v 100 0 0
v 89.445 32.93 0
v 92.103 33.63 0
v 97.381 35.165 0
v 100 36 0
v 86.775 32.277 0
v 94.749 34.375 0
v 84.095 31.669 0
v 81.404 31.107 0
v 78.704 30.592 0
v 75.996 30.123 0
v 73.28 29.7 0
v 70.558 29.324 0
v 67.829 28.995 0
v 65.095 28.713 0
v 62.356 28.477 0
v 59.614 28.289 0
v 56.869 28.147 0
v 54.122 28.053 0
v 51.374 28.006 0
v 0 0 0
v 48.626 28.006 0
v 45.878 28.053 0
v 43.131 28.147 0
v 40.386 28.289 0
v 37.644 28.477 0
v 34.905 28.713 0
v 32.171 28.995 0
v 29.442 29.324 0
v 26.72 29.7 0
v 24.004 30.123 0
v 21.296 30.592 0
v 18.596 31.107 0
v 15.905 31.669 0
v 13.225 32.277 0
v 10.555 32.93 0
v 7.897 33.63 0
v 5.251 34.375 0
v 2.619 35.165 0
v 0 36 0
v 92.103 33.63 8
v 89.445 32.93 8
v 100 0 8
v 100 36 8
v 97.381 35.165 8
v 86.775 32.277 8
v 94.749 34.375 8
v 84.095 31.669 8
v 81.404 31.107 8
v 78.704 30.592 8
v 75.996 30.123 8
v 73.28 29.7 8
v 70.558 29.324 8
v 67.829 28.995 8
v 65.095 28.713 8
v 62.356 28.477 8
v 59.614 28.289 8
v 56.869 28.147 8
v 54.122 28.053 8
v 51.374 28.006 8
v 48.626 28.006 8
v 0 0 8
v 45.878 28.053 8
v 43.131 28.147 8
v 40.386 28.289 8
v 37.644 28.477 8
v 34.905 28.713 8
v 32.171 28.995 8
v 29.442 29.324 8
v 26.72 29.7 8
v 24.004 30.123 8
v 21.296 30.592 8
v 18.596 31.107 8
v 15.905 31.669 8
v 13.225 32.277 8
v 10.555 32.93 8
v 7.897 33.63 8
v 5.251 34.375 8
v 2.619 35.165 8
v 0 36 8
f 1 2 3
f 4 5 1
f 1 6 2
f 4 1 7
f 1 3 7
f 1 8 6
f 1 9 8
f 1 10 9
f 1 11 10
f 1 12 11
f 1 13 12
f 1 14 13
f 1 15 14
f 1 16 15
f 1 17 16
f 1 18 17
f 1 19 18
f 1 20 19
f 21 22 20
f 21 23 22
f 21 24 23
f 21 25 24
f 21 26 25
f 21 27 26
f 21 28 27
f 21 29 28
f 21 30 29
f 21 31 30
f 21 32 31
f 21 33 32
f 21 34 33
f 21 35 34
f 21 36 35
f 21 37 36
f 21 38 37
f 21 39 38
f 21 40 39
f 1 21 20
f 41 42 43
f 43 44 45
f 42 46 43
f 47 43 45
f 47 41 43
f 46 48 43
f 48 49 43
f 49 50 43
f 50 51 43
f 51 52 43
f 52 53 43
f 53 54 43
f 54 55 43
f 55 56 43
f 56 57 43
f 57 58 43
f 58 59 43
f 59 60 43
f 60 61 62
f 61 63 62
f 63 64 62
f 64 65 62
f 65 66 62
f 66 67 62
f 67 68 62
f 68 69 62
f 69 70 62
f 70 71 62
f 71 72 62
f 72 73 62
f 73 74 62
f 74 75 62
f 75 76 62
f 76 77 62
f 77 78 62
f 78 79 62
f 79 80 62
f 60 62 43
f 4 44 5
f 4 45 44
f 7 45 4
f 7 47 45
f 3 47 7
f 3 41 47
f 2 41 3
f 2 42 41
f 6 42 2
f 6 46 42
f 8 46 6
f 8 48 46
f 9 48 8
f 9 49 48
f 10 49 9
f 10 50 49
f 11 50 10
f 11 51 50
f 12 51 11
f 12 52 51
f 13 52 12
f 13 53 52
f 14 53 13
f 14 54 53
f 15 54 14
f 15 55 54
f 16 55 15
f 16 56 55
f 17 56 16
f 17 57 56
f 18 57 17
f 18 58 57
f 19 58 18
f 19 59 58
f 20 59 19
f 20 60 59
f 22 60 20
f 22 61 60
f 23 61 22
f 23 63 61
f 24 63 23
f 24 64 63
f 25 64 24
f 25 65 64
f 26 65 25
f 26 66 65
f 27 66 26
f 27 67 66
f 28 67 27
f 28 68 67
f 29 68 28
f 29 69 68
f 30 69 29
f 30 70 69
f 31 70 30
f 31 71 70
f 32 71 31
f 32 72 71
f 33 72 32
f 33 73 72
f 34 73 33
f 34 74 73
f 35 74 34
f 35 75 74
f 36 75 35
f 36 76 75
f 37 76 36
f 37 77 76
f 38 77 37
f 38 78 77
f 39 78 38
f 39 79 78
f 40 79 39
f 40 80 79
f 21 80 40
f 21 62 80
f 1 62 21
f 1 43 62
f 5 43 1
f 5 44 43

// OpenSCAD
$fn = 32;

// ----------------------------------------------------------------------
// Arc profile plate: notch, 40 points
// ----------------------------------------------------------------------

// --- parameters (mm) ---
bar_l = 100;              // bar length, X
bar_w = 36;               // bar width, Y
notch_depth = 8;          // depth of the arc notch at mid-span
arc_r = 160.25;           // radius of the notch arc
arc_angle = 36.36;        // notch arc angle, degrees
arc_step = 1;             // sampling step of the notch arc, degrees
plate_t = 8;              // plate thickness, Z

profile = [[0, 0], [100, 0], [100, 36], [97.381, 35.165], [94.749, 34.375], [92.103, 33.63], [89.445, 32.93], [86.775, 32.277], [84.095, 31.669], [81.404, 31.107], [78.704, 30.592], [75.996, 30.123], [73.28, 29.7], [70.558, 29.324], [67.829, 28.995], [65.095, 28.713], [62.356, 28.477], [59.614, 28.289], [56.869, 28.147], [54.122, 28.053], [51.374, 28.006], [48.626, 28.006], [45.878, 28.053], [43.131, 28.147], [40.386, 28.289], [37.644, 28.477], [34.905, 28.713], [32.171, 28.995], [29.442, 29.324], [26.72, 29.7], [24.004, 30.123], [21.296, 30.592], [18.596, 31.107], [15.905, 31.669], [13.225, 32.277], [10.555, 32.93], [7.897, 33.63], [5.251, 34.375], [2.619, 35.165], [0, 36]];  // primary outline, 40 points, counter clockwise

// --- the one profile operation ---
linear_extrude(height = plate_t) polygon(points = profile);
